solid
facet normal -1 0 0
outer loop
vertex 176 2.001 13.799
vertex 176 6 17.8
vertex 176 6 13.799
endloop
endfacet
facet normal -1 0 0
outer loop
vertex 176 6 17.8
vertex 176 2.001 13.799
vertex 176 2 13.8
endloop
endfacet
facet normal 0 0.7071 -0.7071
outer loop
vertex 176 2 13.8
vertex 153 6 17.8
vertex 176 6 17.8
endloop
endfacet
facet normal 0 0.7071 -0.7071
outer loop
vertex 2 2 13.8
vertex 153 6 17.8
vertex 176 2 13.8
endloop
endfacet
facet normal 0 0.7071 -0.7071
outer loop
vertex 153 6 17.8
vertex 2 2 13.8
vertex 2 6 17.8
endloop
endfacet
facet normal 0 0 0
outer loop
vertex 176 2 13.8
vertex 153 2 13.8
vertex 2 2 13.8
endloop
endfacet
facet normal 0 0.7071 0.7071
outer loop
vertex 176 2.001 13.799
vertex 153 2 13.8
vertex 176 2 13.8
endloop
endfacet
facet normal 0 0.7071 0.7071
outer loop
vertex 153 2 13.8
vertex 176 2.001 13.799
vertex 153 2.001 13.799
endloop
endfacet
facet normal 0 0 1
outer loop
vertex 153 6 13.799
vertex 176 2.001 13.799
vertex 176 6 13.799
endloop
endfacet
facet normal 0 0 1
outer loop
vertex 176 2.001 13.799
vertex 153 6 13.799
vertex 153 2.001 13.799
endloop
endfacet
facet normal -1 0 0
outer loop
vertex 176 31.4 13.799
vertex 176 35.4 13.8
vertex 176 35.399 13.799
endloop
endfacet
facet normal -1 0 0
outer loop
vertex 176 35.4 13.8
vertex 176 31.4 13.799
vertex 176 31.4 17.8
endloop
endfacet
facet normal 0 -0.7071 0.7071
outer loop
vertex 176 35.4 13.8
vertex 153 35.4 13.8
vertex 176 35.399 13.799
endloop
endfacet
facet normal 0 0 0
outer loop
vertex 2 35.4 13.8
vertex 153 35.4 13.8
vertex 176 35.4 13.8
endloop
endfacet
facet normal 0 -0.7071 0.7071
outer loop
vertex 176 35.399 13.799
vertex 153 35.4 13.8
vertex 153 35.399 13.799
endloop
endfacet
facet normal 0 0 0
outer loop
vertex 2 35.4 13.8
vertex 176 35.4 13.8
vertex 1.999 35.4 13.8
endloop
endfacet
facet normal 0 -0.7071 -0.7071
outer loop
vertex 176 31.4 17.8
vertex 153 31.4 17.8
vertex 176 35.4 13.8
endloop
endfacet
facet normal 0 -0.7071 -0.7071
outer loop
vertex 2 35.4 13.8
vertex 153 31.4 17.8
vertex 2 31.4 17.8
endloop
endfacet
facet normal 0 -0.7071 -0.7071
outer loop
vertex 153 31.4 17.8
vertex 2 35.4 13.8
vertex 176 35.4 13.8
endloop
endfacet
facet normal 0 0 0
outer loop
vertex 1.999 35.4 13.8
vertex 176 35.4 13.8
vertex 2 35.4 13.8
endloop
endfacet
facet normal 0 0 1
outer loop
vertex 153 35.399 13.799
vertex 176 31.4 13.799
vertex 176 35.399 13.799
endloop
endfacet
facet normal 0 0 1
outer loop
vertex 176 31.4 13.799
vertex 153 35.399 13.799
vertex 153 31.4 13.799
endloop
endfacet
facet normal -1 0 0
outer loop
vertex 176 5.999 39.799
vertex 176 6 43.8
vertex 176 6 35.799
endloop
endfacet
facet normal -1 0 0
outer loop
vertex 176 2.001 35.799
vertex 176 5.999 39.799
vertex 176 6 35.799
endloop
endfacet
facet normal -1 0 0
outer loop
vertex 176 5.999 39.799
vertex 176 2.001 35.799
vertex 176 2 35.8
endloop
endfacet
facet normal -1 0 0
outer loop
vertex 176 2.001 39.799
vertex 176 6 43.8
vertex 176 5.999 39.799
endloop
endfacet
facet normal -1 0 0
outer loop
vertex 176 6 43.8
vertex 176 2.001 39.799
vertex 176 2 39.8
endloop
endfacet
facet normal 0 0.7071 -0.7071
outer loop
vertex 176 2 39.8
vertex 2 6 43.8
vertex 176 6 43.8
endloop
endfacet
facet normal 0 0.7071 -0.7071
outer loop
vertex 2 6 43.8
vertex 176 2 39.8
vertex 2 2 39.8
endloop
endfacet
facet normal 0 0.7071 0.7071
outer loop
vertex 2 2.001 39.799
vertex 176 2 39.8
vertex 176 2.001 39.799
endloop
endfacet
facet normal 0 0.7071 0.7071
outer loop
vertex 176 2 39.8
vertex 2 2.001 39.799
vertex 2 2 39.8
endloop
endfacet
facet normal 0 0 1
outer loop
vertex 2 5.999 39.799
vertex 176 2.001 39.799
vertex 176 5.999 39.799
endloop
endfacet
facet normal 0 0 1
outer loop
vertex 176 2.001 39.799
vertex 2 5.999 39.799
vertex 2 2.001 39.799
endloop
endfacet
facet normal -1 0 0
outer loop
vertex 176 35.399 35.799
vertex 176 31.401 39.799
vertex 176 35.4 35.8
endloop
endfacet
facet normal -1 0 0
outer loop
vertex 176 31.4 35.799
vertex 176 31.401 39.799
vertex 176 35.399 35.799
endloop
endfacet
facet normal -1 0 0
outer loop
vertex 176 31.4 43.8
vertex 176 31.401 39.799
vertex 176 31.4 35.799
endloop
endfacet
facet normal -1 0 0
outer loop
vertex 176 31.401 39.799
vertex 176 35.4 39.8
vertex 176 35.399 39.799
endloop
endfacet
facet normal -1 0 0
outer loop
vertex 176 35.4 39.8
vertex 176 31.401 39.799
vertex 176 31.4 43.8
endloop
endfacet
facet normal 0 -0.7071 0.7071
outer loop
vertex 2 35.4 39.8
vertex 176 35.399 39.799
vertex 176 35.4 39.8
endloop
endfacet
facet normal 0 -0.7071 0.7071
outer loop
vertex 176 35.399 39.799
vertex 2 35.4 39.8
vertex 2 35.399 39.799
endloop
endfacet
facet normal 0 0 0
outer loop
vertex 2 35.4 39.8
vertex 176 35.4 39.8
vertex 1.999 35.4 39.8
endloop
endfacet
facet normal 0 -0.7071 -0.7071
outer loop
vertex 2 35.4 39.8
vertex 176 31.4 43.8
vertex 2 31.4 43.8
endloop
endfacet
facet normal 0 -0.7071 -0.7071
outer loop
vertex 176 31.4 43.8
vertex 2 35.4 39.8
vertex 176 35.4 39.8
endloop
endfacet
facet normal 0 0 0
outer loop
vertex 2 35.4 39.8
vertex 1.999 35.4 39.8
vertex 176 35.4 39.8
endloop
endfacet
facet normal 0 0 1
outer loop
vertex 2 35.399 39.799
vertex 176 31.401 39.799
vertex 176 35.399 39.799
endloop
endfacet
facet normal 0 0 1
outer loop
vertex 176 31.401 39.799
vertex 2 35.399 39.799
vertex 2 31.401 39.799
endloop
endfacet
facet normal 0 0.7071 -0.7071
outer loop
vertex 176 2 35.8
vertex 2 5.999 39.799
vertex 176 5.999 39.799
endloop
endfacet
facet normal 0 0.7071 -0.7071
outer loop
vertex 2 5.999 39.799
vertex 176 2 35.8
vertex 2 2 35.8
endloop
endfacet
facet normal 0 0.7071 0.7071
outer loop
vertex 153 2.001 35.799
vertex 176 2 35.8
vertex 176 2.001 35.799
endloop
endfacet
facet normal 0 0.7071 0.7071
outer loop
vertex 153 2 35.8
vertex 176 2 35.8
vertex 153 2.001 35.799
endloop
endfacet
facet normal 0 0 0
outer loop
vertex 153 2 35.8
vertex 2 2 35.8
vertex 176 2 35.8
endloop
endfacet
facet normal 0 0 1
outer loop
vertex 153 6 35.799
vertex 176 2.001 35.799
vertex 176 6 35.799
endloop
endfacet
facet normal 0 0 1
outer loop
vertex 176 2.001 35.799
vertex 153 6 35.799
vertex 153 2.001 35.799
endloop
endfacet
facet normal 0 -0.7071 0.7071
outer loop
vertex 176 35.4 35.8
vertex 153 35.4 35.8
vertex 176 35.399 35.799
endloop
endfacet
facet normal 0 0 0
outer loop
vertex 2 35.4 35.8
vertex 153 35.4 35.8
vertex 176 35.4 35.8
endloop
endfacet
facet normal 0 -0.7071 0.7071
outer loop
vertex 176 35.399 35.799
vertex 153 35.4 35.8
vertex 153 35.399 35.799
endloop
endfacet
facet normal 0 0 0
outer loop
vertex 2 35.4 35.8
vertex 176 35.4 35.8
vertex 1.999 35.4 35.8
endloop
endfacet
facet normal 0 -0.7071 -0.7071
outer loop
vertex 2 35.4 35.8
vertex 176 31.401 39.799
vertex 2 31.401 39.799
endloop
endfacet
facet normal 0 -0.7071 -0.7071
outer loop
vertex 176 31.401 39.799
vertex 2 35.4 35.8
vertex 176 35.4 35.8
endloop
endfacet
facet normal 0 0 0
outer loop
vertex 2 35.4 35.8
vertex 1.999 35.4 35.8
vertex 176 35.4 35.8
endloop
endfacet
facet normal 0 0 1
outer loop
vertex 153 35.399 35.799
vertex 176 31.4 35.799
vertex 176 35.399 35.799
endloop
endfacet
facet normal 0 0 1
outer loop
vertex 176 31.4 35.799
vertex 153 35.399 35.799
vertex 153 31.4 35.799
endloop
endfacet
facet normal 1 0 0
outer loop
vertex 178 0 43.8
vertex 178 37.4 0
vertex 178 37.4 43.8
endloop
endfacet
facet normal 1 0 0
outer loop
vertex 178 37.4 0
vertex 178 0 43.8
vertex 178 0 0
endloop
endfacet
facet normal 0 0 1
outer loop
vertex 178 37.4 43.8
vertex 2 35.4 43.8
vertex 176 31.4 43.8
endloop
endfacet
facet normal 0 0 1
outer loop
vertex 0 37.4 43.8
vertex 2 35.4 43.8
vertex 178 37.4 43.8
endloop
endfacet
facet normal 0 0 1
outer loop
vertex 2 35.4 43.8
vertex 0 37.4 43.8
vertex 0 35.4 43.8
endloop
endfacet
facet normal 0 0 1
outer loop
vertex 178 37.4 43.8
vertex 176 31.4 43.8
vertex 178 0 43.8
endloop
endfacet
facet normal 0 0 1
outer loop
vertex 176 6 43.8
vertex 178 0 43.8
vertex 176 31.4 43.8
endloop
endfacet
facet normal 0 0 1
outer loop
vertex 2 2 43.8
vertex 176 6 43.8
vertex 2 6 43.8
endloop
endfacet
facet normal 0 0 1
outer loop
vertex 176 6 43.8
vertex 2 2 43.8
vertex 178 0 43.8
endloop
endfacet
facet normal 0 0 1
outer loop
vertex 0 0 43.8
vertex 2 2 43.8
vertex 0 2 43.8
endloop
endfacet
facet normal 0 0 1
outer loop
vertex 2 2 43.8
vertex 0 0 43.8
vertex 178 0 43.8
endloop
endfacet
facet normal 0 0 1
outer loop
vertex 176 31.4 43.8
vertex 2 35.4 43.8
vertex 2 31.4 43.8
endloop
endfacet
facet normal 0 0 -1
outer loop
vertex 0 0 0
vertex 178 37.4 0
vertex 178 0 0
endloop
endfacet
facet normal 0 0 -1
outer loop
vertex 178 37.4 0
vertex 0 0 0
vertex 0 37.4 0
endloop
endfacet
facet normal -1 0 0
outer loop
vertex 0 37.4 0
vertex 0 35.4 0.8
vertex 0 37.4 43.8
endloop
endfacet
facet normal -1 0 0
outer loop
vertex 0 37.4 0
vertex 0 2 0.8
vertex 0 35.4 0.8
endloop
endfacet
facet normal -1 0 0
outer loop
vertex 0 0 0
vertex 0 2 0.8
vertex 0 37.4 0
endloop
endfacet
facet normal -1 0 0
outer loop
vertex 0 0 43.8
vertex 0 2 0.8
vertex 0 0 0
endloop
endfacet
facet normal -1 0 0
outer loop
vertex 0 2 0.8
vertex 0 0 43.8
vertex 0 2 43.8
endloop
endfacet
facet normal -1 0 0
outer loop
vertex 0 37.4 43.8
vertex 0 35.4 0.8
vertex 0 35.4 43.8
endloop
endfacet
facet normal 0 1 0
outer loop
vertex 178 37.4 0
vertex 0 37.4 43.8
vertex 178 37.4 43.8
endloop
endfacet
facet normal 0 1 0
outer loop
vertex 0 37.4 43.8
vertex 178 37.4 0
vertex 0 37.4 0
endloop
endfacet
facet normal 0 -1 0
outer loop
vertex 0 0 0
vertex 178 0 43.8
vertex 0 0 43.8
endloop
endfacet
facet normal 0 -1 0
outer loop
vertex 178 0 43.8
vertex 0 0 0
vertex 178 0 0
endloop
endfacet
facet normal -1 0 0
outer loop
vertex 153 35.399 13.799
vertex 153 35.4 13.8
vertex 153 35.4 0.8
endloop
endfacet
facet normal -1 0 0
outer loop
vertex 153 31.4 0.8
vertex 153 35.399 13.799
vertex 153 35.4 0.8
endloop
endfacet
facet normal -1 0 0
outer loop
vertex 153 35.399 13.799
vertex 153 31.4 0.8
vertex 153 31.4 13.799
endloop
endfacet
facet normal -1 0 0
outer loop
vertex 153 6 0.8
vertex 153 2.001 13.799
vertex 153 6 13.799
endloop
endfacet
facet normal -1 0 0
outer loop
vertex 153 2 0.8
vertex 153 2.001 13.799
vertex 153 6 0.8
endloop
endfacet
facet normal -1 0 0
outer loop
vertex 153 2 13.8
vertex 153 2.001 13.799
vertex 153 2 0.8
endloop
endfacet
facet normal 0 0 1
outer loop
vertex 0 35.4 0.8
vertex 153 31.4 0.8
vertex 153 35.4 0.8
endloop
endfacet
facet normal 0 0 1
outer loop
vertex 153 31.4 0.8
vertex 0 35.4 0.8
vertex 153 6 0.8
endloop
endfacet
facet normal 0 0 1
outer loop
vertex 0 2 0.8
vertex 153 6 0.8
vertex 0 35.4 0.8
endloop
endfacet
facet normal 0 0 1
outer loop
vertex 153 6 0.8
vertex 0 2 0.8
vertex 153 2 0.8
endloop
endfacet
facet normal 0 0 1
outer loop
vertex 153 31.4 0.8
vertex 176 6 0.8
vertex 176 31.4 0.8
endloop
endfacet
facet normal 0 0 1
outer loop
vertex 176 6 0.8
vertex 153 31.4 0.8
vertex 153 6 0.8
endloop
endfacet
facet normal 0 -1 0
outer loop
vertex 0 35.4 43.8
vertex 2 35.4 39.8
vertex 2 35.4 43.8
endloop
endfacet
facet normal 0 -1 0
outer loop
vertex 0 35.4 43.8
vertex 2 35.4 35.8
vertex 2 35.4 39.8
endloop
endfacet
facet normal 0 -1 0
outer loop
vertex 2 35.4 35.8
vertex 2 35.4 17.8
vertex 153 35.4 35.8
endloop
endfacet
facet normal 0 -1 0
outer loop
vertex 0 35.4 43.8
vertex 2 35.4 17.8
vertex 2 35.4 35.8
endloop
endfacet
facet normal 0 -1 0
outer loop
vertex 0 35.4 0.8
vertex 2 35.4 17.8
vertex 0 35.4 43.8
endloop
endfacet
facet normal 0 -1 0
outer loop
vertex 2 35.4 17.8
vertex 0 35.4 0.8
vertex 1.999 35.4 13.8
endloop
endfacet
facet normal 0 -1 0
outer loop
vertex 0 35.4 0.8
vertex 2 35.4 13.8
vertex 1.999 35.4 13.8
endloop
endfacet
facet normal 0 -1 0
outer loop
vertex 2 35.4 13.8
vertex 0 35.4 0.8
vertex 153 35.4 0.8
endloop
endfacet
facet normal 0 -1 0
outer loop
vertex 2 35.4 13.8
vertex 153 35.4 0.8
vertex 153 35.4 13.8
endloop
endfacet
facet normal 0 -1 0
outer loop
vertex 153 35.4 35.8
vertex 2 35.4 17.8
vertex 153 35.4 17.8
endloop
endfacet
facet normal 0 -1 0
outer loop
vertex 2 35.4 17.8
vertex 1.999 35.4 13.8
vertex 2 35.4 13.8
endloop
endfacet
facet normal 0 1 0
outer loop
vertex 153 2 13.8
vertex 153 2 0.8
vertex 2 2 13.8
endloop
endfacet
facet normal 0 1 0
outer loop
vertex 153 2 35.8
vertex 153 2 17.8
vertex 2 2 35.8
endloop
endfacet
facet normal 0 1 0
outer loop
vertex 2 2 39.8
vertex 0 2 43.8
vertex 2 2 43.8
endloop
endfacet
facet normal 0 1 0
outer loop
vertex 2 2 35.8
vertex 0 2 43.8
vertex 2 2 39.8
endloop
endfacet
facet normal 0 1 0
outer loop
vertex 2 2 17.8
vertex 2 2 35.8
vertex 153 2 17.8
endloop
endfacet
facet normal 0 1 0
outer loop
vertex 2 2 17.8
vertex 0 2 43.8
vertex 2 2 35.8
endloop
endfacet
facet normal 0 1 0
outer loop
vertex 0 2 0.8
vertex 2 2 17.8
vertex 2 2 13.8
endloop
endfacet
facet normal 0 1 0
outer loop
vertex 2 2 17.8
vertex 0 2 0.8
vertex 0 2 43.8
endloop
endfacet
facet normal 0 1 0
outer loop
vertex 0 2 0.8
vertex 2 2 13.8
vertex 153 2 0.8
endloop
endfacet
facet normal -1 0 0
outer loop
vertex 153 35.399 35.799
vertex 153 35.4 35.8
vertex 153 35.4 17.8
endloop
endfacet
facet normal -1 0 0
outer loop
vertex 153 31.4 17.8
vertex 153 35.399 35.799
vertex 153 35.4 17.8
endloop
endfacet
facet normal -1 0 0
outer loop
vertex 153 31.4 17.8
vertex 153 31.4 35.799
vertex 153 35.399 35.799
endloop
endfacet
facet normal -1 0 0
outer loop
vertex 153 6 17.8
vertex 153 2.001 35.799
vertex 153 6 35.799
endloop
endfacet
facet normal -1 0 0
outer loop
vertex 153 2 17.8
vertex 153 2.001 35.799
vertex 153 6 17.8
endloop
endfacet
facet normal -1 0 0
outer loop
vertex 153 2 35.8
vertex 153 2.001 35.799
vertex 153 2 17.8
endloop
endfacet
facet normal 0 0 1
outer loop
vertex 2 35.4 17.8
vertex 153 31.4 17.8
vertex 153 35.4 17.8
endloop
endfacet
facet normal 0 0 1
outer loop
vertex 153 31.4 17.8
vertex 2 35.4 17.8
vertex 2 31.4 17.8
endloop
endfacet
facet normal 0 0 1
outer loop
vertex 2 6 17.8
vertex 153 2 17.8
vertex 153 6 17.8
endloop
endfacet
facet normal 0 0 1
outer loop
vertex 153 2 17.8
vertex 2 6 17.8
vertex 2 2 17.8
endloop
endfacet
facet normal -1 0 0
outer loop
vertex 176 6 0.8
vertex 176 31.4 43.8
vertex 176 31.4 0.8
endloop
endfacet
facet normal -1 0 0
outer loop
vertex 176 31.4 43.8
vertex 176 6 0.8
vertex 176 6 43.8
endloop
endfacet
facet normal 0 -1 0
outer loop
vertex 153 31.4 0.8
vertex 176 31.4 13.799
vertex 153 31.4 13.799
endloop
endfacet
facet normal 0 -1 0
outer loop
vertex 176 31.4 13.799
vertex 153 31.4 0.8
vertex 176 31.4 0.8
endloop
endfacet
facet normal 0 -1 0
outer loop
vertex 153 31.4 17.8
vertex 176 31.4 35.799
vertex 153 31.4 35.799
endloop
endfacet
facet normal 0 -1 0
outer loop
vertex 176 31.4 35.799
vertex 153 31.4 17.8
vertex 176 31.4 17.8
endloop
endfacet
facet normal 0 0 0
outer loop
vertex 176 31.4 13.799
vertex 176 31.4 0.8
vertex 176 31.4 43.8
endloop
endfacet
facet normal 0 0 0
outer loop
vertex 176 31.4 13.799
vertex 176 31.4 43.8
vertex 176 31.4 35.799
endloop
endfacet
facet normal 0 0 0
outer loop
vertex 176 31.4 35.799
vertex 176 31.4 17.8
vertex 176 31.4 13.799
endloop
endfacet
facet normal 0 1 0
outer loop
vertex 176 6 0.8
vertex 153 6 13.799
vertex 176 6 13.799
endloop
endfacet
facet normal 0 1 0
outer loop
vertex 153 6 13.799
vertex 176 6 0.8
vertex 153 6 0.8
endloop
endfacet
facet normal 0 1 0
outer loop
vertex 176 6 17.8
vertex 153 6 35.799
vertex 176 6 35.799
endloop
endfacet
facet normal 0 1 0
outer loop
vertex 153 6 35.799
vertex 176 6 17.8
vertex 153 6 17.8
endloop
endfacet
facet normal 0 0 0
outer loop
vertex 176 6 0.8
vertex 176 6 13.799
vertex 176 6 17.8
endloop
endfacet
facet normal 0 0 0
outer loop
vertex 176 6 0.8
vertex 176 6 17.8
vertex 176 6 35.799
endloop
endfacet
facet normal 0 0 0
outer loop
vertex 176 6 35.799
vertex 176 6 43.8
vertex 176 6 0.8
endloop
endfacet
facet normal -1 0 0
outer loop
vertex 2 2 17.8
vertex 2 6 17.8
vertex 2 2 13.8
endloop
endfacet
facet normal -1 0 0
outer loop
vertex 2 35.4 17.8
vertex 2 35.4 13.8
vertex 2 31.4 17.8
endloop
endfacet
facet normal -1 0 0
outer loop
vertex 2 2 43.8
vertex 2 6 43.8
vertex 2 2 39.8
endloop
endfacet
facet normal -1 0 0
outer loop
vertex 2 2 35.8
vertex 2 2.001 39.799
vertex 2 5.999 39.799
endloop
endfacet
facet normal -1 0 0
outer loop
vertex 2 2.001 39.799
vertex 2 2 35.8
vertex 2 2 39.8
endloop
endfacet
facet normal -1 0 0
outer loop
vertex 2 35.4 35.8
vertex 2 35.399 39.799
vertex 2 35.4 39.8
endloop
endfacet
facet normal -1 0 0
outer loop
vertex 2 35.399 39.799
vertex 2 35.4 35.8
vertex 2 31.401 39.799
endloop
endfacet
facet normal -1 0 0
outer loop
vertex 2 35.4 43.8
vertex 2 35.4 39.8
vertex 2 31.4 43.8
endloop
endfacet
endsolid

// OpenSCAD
// (c) 2020 Gergo Torcsvari
// This code is licensed under MIT license (see LICENSE.txt for details)

//pael dimensions
panelZ = 13;
panelY = 33.4;
panelX = 128;

//for bottom layer config
layerHeight = 0.2;
minZWall =  layerHeight*4;

//for wall and additional dimensions
normalWallW = 2;
additionalSpacers = 25;
topSpace = 30;

//USB hole dimensions
usbW = 12; //7.2
usbH = 6; //4

//helper constants
holderW = 4;
err = 0.001;

//uncomment below to visualize the panel
//translate([additionalSpacers,normalWallW,minZWall]) color("red") cube([panelX, panelY, panelZ]);

//test print helper, uncommennt the cube and base/top for test renders
//uncommennt only the top/base to render it
intersection(){
//cube([30, 100, 100]);
base();
//top();
}

//////////////////////////////////////

module nute() {
    difference() {
        rotate([45,0,0])
           cube([2*additionalSpacers-2*normalWallW+panelX+err, sqrt(2)*holderW,  sqrt(2)*holderW]);
        translate([-err,-holderW, 0]) cube([2*additionalSpacers-normalWallW+panelX+3*err, 2*holderW,  holderW-err]);
    }
}

module top() {
  difference(){
    union(){
      translate([0, normalWallW, minZWall])
        cube([normalWallW, panelY, panelZ+topSpace]);
      translate([0, normalWallW+holderW+layerHeight, minZWall+panelZ+topSpace-holderW])
        cube([2*additionalSpacers+panelX-normalWallW-layerHeight, panelY-2*holderW-2*layerHeight, holderW]);
      translate([0,normalWallW-holderW+panelY-layerHeight,minZWall+panelZ+topSpace-2*holderW])
        nute();
      translate([0,normalWallW+holderW+layerHeight,minZWall+panelZ+topSpace-2*holderW])
        nute();
    }
    translate([-err,panelY/2 + normalWallW-usbW/2, minZWall+panelZ+topSpace-2*holderW-2*layerHeight-usbH/2+2]) cube([12+err,usbW,usbH]);  
  }
}

module base() {
    difference() {
      cube([panelX+2*additionalSpacers, panelY+2*normalWallW, minZWall + panelZ + topSpace]);
      translate([-err,normalWallW,minZWall]) 
        cube([additionalSpacers+panelX+err, panelY, panelZ]);
      translate([-err,normalWallW,minZWall+panelZ + holderW]) 
        cube([additionalSpacers+panelX+err, panelY, topSpace - 3*holderW]);
      translate([-err,normalWallW+holderW,minZWall]) 
        cube([2*additionalSpacers-normalWallW+panelX+err, panelY-2*holderW, panelZ+topSpace + err]);
      translate([-err+normalWallW,normalWallW+holderW,minZWall+panelZ-holderW]) 
        nute();
      translate([-err+normalWallW,normalWallW-holderW+panelY,minZWall+panelZ-holderW]) 
        nute();
      translate([-err+normalWallW,normalWallW+holderW,minZWall+panelZ+topSpace-2*holderW])
           nute();
      translate([-err+normalWallW,normalWallW-holderW+panelY,minZWall+panelZ+topSpace-2*holderW])
           nute();
       translate([-err+normalWallW,normalWallW+holderW,minZWall+panelZ+topSpace-3*holderW])
           nute();
      translate([-err+normalWallW,normalWallW-holderW+panelY,minZWall+panelZ+topSpace-3*holderW])
           nute();
      translate([-err, normalWallW, minZWall])
        cube([normalWallW+err, panelY, minZWall+panelZ+topSpace]);
    }
}
